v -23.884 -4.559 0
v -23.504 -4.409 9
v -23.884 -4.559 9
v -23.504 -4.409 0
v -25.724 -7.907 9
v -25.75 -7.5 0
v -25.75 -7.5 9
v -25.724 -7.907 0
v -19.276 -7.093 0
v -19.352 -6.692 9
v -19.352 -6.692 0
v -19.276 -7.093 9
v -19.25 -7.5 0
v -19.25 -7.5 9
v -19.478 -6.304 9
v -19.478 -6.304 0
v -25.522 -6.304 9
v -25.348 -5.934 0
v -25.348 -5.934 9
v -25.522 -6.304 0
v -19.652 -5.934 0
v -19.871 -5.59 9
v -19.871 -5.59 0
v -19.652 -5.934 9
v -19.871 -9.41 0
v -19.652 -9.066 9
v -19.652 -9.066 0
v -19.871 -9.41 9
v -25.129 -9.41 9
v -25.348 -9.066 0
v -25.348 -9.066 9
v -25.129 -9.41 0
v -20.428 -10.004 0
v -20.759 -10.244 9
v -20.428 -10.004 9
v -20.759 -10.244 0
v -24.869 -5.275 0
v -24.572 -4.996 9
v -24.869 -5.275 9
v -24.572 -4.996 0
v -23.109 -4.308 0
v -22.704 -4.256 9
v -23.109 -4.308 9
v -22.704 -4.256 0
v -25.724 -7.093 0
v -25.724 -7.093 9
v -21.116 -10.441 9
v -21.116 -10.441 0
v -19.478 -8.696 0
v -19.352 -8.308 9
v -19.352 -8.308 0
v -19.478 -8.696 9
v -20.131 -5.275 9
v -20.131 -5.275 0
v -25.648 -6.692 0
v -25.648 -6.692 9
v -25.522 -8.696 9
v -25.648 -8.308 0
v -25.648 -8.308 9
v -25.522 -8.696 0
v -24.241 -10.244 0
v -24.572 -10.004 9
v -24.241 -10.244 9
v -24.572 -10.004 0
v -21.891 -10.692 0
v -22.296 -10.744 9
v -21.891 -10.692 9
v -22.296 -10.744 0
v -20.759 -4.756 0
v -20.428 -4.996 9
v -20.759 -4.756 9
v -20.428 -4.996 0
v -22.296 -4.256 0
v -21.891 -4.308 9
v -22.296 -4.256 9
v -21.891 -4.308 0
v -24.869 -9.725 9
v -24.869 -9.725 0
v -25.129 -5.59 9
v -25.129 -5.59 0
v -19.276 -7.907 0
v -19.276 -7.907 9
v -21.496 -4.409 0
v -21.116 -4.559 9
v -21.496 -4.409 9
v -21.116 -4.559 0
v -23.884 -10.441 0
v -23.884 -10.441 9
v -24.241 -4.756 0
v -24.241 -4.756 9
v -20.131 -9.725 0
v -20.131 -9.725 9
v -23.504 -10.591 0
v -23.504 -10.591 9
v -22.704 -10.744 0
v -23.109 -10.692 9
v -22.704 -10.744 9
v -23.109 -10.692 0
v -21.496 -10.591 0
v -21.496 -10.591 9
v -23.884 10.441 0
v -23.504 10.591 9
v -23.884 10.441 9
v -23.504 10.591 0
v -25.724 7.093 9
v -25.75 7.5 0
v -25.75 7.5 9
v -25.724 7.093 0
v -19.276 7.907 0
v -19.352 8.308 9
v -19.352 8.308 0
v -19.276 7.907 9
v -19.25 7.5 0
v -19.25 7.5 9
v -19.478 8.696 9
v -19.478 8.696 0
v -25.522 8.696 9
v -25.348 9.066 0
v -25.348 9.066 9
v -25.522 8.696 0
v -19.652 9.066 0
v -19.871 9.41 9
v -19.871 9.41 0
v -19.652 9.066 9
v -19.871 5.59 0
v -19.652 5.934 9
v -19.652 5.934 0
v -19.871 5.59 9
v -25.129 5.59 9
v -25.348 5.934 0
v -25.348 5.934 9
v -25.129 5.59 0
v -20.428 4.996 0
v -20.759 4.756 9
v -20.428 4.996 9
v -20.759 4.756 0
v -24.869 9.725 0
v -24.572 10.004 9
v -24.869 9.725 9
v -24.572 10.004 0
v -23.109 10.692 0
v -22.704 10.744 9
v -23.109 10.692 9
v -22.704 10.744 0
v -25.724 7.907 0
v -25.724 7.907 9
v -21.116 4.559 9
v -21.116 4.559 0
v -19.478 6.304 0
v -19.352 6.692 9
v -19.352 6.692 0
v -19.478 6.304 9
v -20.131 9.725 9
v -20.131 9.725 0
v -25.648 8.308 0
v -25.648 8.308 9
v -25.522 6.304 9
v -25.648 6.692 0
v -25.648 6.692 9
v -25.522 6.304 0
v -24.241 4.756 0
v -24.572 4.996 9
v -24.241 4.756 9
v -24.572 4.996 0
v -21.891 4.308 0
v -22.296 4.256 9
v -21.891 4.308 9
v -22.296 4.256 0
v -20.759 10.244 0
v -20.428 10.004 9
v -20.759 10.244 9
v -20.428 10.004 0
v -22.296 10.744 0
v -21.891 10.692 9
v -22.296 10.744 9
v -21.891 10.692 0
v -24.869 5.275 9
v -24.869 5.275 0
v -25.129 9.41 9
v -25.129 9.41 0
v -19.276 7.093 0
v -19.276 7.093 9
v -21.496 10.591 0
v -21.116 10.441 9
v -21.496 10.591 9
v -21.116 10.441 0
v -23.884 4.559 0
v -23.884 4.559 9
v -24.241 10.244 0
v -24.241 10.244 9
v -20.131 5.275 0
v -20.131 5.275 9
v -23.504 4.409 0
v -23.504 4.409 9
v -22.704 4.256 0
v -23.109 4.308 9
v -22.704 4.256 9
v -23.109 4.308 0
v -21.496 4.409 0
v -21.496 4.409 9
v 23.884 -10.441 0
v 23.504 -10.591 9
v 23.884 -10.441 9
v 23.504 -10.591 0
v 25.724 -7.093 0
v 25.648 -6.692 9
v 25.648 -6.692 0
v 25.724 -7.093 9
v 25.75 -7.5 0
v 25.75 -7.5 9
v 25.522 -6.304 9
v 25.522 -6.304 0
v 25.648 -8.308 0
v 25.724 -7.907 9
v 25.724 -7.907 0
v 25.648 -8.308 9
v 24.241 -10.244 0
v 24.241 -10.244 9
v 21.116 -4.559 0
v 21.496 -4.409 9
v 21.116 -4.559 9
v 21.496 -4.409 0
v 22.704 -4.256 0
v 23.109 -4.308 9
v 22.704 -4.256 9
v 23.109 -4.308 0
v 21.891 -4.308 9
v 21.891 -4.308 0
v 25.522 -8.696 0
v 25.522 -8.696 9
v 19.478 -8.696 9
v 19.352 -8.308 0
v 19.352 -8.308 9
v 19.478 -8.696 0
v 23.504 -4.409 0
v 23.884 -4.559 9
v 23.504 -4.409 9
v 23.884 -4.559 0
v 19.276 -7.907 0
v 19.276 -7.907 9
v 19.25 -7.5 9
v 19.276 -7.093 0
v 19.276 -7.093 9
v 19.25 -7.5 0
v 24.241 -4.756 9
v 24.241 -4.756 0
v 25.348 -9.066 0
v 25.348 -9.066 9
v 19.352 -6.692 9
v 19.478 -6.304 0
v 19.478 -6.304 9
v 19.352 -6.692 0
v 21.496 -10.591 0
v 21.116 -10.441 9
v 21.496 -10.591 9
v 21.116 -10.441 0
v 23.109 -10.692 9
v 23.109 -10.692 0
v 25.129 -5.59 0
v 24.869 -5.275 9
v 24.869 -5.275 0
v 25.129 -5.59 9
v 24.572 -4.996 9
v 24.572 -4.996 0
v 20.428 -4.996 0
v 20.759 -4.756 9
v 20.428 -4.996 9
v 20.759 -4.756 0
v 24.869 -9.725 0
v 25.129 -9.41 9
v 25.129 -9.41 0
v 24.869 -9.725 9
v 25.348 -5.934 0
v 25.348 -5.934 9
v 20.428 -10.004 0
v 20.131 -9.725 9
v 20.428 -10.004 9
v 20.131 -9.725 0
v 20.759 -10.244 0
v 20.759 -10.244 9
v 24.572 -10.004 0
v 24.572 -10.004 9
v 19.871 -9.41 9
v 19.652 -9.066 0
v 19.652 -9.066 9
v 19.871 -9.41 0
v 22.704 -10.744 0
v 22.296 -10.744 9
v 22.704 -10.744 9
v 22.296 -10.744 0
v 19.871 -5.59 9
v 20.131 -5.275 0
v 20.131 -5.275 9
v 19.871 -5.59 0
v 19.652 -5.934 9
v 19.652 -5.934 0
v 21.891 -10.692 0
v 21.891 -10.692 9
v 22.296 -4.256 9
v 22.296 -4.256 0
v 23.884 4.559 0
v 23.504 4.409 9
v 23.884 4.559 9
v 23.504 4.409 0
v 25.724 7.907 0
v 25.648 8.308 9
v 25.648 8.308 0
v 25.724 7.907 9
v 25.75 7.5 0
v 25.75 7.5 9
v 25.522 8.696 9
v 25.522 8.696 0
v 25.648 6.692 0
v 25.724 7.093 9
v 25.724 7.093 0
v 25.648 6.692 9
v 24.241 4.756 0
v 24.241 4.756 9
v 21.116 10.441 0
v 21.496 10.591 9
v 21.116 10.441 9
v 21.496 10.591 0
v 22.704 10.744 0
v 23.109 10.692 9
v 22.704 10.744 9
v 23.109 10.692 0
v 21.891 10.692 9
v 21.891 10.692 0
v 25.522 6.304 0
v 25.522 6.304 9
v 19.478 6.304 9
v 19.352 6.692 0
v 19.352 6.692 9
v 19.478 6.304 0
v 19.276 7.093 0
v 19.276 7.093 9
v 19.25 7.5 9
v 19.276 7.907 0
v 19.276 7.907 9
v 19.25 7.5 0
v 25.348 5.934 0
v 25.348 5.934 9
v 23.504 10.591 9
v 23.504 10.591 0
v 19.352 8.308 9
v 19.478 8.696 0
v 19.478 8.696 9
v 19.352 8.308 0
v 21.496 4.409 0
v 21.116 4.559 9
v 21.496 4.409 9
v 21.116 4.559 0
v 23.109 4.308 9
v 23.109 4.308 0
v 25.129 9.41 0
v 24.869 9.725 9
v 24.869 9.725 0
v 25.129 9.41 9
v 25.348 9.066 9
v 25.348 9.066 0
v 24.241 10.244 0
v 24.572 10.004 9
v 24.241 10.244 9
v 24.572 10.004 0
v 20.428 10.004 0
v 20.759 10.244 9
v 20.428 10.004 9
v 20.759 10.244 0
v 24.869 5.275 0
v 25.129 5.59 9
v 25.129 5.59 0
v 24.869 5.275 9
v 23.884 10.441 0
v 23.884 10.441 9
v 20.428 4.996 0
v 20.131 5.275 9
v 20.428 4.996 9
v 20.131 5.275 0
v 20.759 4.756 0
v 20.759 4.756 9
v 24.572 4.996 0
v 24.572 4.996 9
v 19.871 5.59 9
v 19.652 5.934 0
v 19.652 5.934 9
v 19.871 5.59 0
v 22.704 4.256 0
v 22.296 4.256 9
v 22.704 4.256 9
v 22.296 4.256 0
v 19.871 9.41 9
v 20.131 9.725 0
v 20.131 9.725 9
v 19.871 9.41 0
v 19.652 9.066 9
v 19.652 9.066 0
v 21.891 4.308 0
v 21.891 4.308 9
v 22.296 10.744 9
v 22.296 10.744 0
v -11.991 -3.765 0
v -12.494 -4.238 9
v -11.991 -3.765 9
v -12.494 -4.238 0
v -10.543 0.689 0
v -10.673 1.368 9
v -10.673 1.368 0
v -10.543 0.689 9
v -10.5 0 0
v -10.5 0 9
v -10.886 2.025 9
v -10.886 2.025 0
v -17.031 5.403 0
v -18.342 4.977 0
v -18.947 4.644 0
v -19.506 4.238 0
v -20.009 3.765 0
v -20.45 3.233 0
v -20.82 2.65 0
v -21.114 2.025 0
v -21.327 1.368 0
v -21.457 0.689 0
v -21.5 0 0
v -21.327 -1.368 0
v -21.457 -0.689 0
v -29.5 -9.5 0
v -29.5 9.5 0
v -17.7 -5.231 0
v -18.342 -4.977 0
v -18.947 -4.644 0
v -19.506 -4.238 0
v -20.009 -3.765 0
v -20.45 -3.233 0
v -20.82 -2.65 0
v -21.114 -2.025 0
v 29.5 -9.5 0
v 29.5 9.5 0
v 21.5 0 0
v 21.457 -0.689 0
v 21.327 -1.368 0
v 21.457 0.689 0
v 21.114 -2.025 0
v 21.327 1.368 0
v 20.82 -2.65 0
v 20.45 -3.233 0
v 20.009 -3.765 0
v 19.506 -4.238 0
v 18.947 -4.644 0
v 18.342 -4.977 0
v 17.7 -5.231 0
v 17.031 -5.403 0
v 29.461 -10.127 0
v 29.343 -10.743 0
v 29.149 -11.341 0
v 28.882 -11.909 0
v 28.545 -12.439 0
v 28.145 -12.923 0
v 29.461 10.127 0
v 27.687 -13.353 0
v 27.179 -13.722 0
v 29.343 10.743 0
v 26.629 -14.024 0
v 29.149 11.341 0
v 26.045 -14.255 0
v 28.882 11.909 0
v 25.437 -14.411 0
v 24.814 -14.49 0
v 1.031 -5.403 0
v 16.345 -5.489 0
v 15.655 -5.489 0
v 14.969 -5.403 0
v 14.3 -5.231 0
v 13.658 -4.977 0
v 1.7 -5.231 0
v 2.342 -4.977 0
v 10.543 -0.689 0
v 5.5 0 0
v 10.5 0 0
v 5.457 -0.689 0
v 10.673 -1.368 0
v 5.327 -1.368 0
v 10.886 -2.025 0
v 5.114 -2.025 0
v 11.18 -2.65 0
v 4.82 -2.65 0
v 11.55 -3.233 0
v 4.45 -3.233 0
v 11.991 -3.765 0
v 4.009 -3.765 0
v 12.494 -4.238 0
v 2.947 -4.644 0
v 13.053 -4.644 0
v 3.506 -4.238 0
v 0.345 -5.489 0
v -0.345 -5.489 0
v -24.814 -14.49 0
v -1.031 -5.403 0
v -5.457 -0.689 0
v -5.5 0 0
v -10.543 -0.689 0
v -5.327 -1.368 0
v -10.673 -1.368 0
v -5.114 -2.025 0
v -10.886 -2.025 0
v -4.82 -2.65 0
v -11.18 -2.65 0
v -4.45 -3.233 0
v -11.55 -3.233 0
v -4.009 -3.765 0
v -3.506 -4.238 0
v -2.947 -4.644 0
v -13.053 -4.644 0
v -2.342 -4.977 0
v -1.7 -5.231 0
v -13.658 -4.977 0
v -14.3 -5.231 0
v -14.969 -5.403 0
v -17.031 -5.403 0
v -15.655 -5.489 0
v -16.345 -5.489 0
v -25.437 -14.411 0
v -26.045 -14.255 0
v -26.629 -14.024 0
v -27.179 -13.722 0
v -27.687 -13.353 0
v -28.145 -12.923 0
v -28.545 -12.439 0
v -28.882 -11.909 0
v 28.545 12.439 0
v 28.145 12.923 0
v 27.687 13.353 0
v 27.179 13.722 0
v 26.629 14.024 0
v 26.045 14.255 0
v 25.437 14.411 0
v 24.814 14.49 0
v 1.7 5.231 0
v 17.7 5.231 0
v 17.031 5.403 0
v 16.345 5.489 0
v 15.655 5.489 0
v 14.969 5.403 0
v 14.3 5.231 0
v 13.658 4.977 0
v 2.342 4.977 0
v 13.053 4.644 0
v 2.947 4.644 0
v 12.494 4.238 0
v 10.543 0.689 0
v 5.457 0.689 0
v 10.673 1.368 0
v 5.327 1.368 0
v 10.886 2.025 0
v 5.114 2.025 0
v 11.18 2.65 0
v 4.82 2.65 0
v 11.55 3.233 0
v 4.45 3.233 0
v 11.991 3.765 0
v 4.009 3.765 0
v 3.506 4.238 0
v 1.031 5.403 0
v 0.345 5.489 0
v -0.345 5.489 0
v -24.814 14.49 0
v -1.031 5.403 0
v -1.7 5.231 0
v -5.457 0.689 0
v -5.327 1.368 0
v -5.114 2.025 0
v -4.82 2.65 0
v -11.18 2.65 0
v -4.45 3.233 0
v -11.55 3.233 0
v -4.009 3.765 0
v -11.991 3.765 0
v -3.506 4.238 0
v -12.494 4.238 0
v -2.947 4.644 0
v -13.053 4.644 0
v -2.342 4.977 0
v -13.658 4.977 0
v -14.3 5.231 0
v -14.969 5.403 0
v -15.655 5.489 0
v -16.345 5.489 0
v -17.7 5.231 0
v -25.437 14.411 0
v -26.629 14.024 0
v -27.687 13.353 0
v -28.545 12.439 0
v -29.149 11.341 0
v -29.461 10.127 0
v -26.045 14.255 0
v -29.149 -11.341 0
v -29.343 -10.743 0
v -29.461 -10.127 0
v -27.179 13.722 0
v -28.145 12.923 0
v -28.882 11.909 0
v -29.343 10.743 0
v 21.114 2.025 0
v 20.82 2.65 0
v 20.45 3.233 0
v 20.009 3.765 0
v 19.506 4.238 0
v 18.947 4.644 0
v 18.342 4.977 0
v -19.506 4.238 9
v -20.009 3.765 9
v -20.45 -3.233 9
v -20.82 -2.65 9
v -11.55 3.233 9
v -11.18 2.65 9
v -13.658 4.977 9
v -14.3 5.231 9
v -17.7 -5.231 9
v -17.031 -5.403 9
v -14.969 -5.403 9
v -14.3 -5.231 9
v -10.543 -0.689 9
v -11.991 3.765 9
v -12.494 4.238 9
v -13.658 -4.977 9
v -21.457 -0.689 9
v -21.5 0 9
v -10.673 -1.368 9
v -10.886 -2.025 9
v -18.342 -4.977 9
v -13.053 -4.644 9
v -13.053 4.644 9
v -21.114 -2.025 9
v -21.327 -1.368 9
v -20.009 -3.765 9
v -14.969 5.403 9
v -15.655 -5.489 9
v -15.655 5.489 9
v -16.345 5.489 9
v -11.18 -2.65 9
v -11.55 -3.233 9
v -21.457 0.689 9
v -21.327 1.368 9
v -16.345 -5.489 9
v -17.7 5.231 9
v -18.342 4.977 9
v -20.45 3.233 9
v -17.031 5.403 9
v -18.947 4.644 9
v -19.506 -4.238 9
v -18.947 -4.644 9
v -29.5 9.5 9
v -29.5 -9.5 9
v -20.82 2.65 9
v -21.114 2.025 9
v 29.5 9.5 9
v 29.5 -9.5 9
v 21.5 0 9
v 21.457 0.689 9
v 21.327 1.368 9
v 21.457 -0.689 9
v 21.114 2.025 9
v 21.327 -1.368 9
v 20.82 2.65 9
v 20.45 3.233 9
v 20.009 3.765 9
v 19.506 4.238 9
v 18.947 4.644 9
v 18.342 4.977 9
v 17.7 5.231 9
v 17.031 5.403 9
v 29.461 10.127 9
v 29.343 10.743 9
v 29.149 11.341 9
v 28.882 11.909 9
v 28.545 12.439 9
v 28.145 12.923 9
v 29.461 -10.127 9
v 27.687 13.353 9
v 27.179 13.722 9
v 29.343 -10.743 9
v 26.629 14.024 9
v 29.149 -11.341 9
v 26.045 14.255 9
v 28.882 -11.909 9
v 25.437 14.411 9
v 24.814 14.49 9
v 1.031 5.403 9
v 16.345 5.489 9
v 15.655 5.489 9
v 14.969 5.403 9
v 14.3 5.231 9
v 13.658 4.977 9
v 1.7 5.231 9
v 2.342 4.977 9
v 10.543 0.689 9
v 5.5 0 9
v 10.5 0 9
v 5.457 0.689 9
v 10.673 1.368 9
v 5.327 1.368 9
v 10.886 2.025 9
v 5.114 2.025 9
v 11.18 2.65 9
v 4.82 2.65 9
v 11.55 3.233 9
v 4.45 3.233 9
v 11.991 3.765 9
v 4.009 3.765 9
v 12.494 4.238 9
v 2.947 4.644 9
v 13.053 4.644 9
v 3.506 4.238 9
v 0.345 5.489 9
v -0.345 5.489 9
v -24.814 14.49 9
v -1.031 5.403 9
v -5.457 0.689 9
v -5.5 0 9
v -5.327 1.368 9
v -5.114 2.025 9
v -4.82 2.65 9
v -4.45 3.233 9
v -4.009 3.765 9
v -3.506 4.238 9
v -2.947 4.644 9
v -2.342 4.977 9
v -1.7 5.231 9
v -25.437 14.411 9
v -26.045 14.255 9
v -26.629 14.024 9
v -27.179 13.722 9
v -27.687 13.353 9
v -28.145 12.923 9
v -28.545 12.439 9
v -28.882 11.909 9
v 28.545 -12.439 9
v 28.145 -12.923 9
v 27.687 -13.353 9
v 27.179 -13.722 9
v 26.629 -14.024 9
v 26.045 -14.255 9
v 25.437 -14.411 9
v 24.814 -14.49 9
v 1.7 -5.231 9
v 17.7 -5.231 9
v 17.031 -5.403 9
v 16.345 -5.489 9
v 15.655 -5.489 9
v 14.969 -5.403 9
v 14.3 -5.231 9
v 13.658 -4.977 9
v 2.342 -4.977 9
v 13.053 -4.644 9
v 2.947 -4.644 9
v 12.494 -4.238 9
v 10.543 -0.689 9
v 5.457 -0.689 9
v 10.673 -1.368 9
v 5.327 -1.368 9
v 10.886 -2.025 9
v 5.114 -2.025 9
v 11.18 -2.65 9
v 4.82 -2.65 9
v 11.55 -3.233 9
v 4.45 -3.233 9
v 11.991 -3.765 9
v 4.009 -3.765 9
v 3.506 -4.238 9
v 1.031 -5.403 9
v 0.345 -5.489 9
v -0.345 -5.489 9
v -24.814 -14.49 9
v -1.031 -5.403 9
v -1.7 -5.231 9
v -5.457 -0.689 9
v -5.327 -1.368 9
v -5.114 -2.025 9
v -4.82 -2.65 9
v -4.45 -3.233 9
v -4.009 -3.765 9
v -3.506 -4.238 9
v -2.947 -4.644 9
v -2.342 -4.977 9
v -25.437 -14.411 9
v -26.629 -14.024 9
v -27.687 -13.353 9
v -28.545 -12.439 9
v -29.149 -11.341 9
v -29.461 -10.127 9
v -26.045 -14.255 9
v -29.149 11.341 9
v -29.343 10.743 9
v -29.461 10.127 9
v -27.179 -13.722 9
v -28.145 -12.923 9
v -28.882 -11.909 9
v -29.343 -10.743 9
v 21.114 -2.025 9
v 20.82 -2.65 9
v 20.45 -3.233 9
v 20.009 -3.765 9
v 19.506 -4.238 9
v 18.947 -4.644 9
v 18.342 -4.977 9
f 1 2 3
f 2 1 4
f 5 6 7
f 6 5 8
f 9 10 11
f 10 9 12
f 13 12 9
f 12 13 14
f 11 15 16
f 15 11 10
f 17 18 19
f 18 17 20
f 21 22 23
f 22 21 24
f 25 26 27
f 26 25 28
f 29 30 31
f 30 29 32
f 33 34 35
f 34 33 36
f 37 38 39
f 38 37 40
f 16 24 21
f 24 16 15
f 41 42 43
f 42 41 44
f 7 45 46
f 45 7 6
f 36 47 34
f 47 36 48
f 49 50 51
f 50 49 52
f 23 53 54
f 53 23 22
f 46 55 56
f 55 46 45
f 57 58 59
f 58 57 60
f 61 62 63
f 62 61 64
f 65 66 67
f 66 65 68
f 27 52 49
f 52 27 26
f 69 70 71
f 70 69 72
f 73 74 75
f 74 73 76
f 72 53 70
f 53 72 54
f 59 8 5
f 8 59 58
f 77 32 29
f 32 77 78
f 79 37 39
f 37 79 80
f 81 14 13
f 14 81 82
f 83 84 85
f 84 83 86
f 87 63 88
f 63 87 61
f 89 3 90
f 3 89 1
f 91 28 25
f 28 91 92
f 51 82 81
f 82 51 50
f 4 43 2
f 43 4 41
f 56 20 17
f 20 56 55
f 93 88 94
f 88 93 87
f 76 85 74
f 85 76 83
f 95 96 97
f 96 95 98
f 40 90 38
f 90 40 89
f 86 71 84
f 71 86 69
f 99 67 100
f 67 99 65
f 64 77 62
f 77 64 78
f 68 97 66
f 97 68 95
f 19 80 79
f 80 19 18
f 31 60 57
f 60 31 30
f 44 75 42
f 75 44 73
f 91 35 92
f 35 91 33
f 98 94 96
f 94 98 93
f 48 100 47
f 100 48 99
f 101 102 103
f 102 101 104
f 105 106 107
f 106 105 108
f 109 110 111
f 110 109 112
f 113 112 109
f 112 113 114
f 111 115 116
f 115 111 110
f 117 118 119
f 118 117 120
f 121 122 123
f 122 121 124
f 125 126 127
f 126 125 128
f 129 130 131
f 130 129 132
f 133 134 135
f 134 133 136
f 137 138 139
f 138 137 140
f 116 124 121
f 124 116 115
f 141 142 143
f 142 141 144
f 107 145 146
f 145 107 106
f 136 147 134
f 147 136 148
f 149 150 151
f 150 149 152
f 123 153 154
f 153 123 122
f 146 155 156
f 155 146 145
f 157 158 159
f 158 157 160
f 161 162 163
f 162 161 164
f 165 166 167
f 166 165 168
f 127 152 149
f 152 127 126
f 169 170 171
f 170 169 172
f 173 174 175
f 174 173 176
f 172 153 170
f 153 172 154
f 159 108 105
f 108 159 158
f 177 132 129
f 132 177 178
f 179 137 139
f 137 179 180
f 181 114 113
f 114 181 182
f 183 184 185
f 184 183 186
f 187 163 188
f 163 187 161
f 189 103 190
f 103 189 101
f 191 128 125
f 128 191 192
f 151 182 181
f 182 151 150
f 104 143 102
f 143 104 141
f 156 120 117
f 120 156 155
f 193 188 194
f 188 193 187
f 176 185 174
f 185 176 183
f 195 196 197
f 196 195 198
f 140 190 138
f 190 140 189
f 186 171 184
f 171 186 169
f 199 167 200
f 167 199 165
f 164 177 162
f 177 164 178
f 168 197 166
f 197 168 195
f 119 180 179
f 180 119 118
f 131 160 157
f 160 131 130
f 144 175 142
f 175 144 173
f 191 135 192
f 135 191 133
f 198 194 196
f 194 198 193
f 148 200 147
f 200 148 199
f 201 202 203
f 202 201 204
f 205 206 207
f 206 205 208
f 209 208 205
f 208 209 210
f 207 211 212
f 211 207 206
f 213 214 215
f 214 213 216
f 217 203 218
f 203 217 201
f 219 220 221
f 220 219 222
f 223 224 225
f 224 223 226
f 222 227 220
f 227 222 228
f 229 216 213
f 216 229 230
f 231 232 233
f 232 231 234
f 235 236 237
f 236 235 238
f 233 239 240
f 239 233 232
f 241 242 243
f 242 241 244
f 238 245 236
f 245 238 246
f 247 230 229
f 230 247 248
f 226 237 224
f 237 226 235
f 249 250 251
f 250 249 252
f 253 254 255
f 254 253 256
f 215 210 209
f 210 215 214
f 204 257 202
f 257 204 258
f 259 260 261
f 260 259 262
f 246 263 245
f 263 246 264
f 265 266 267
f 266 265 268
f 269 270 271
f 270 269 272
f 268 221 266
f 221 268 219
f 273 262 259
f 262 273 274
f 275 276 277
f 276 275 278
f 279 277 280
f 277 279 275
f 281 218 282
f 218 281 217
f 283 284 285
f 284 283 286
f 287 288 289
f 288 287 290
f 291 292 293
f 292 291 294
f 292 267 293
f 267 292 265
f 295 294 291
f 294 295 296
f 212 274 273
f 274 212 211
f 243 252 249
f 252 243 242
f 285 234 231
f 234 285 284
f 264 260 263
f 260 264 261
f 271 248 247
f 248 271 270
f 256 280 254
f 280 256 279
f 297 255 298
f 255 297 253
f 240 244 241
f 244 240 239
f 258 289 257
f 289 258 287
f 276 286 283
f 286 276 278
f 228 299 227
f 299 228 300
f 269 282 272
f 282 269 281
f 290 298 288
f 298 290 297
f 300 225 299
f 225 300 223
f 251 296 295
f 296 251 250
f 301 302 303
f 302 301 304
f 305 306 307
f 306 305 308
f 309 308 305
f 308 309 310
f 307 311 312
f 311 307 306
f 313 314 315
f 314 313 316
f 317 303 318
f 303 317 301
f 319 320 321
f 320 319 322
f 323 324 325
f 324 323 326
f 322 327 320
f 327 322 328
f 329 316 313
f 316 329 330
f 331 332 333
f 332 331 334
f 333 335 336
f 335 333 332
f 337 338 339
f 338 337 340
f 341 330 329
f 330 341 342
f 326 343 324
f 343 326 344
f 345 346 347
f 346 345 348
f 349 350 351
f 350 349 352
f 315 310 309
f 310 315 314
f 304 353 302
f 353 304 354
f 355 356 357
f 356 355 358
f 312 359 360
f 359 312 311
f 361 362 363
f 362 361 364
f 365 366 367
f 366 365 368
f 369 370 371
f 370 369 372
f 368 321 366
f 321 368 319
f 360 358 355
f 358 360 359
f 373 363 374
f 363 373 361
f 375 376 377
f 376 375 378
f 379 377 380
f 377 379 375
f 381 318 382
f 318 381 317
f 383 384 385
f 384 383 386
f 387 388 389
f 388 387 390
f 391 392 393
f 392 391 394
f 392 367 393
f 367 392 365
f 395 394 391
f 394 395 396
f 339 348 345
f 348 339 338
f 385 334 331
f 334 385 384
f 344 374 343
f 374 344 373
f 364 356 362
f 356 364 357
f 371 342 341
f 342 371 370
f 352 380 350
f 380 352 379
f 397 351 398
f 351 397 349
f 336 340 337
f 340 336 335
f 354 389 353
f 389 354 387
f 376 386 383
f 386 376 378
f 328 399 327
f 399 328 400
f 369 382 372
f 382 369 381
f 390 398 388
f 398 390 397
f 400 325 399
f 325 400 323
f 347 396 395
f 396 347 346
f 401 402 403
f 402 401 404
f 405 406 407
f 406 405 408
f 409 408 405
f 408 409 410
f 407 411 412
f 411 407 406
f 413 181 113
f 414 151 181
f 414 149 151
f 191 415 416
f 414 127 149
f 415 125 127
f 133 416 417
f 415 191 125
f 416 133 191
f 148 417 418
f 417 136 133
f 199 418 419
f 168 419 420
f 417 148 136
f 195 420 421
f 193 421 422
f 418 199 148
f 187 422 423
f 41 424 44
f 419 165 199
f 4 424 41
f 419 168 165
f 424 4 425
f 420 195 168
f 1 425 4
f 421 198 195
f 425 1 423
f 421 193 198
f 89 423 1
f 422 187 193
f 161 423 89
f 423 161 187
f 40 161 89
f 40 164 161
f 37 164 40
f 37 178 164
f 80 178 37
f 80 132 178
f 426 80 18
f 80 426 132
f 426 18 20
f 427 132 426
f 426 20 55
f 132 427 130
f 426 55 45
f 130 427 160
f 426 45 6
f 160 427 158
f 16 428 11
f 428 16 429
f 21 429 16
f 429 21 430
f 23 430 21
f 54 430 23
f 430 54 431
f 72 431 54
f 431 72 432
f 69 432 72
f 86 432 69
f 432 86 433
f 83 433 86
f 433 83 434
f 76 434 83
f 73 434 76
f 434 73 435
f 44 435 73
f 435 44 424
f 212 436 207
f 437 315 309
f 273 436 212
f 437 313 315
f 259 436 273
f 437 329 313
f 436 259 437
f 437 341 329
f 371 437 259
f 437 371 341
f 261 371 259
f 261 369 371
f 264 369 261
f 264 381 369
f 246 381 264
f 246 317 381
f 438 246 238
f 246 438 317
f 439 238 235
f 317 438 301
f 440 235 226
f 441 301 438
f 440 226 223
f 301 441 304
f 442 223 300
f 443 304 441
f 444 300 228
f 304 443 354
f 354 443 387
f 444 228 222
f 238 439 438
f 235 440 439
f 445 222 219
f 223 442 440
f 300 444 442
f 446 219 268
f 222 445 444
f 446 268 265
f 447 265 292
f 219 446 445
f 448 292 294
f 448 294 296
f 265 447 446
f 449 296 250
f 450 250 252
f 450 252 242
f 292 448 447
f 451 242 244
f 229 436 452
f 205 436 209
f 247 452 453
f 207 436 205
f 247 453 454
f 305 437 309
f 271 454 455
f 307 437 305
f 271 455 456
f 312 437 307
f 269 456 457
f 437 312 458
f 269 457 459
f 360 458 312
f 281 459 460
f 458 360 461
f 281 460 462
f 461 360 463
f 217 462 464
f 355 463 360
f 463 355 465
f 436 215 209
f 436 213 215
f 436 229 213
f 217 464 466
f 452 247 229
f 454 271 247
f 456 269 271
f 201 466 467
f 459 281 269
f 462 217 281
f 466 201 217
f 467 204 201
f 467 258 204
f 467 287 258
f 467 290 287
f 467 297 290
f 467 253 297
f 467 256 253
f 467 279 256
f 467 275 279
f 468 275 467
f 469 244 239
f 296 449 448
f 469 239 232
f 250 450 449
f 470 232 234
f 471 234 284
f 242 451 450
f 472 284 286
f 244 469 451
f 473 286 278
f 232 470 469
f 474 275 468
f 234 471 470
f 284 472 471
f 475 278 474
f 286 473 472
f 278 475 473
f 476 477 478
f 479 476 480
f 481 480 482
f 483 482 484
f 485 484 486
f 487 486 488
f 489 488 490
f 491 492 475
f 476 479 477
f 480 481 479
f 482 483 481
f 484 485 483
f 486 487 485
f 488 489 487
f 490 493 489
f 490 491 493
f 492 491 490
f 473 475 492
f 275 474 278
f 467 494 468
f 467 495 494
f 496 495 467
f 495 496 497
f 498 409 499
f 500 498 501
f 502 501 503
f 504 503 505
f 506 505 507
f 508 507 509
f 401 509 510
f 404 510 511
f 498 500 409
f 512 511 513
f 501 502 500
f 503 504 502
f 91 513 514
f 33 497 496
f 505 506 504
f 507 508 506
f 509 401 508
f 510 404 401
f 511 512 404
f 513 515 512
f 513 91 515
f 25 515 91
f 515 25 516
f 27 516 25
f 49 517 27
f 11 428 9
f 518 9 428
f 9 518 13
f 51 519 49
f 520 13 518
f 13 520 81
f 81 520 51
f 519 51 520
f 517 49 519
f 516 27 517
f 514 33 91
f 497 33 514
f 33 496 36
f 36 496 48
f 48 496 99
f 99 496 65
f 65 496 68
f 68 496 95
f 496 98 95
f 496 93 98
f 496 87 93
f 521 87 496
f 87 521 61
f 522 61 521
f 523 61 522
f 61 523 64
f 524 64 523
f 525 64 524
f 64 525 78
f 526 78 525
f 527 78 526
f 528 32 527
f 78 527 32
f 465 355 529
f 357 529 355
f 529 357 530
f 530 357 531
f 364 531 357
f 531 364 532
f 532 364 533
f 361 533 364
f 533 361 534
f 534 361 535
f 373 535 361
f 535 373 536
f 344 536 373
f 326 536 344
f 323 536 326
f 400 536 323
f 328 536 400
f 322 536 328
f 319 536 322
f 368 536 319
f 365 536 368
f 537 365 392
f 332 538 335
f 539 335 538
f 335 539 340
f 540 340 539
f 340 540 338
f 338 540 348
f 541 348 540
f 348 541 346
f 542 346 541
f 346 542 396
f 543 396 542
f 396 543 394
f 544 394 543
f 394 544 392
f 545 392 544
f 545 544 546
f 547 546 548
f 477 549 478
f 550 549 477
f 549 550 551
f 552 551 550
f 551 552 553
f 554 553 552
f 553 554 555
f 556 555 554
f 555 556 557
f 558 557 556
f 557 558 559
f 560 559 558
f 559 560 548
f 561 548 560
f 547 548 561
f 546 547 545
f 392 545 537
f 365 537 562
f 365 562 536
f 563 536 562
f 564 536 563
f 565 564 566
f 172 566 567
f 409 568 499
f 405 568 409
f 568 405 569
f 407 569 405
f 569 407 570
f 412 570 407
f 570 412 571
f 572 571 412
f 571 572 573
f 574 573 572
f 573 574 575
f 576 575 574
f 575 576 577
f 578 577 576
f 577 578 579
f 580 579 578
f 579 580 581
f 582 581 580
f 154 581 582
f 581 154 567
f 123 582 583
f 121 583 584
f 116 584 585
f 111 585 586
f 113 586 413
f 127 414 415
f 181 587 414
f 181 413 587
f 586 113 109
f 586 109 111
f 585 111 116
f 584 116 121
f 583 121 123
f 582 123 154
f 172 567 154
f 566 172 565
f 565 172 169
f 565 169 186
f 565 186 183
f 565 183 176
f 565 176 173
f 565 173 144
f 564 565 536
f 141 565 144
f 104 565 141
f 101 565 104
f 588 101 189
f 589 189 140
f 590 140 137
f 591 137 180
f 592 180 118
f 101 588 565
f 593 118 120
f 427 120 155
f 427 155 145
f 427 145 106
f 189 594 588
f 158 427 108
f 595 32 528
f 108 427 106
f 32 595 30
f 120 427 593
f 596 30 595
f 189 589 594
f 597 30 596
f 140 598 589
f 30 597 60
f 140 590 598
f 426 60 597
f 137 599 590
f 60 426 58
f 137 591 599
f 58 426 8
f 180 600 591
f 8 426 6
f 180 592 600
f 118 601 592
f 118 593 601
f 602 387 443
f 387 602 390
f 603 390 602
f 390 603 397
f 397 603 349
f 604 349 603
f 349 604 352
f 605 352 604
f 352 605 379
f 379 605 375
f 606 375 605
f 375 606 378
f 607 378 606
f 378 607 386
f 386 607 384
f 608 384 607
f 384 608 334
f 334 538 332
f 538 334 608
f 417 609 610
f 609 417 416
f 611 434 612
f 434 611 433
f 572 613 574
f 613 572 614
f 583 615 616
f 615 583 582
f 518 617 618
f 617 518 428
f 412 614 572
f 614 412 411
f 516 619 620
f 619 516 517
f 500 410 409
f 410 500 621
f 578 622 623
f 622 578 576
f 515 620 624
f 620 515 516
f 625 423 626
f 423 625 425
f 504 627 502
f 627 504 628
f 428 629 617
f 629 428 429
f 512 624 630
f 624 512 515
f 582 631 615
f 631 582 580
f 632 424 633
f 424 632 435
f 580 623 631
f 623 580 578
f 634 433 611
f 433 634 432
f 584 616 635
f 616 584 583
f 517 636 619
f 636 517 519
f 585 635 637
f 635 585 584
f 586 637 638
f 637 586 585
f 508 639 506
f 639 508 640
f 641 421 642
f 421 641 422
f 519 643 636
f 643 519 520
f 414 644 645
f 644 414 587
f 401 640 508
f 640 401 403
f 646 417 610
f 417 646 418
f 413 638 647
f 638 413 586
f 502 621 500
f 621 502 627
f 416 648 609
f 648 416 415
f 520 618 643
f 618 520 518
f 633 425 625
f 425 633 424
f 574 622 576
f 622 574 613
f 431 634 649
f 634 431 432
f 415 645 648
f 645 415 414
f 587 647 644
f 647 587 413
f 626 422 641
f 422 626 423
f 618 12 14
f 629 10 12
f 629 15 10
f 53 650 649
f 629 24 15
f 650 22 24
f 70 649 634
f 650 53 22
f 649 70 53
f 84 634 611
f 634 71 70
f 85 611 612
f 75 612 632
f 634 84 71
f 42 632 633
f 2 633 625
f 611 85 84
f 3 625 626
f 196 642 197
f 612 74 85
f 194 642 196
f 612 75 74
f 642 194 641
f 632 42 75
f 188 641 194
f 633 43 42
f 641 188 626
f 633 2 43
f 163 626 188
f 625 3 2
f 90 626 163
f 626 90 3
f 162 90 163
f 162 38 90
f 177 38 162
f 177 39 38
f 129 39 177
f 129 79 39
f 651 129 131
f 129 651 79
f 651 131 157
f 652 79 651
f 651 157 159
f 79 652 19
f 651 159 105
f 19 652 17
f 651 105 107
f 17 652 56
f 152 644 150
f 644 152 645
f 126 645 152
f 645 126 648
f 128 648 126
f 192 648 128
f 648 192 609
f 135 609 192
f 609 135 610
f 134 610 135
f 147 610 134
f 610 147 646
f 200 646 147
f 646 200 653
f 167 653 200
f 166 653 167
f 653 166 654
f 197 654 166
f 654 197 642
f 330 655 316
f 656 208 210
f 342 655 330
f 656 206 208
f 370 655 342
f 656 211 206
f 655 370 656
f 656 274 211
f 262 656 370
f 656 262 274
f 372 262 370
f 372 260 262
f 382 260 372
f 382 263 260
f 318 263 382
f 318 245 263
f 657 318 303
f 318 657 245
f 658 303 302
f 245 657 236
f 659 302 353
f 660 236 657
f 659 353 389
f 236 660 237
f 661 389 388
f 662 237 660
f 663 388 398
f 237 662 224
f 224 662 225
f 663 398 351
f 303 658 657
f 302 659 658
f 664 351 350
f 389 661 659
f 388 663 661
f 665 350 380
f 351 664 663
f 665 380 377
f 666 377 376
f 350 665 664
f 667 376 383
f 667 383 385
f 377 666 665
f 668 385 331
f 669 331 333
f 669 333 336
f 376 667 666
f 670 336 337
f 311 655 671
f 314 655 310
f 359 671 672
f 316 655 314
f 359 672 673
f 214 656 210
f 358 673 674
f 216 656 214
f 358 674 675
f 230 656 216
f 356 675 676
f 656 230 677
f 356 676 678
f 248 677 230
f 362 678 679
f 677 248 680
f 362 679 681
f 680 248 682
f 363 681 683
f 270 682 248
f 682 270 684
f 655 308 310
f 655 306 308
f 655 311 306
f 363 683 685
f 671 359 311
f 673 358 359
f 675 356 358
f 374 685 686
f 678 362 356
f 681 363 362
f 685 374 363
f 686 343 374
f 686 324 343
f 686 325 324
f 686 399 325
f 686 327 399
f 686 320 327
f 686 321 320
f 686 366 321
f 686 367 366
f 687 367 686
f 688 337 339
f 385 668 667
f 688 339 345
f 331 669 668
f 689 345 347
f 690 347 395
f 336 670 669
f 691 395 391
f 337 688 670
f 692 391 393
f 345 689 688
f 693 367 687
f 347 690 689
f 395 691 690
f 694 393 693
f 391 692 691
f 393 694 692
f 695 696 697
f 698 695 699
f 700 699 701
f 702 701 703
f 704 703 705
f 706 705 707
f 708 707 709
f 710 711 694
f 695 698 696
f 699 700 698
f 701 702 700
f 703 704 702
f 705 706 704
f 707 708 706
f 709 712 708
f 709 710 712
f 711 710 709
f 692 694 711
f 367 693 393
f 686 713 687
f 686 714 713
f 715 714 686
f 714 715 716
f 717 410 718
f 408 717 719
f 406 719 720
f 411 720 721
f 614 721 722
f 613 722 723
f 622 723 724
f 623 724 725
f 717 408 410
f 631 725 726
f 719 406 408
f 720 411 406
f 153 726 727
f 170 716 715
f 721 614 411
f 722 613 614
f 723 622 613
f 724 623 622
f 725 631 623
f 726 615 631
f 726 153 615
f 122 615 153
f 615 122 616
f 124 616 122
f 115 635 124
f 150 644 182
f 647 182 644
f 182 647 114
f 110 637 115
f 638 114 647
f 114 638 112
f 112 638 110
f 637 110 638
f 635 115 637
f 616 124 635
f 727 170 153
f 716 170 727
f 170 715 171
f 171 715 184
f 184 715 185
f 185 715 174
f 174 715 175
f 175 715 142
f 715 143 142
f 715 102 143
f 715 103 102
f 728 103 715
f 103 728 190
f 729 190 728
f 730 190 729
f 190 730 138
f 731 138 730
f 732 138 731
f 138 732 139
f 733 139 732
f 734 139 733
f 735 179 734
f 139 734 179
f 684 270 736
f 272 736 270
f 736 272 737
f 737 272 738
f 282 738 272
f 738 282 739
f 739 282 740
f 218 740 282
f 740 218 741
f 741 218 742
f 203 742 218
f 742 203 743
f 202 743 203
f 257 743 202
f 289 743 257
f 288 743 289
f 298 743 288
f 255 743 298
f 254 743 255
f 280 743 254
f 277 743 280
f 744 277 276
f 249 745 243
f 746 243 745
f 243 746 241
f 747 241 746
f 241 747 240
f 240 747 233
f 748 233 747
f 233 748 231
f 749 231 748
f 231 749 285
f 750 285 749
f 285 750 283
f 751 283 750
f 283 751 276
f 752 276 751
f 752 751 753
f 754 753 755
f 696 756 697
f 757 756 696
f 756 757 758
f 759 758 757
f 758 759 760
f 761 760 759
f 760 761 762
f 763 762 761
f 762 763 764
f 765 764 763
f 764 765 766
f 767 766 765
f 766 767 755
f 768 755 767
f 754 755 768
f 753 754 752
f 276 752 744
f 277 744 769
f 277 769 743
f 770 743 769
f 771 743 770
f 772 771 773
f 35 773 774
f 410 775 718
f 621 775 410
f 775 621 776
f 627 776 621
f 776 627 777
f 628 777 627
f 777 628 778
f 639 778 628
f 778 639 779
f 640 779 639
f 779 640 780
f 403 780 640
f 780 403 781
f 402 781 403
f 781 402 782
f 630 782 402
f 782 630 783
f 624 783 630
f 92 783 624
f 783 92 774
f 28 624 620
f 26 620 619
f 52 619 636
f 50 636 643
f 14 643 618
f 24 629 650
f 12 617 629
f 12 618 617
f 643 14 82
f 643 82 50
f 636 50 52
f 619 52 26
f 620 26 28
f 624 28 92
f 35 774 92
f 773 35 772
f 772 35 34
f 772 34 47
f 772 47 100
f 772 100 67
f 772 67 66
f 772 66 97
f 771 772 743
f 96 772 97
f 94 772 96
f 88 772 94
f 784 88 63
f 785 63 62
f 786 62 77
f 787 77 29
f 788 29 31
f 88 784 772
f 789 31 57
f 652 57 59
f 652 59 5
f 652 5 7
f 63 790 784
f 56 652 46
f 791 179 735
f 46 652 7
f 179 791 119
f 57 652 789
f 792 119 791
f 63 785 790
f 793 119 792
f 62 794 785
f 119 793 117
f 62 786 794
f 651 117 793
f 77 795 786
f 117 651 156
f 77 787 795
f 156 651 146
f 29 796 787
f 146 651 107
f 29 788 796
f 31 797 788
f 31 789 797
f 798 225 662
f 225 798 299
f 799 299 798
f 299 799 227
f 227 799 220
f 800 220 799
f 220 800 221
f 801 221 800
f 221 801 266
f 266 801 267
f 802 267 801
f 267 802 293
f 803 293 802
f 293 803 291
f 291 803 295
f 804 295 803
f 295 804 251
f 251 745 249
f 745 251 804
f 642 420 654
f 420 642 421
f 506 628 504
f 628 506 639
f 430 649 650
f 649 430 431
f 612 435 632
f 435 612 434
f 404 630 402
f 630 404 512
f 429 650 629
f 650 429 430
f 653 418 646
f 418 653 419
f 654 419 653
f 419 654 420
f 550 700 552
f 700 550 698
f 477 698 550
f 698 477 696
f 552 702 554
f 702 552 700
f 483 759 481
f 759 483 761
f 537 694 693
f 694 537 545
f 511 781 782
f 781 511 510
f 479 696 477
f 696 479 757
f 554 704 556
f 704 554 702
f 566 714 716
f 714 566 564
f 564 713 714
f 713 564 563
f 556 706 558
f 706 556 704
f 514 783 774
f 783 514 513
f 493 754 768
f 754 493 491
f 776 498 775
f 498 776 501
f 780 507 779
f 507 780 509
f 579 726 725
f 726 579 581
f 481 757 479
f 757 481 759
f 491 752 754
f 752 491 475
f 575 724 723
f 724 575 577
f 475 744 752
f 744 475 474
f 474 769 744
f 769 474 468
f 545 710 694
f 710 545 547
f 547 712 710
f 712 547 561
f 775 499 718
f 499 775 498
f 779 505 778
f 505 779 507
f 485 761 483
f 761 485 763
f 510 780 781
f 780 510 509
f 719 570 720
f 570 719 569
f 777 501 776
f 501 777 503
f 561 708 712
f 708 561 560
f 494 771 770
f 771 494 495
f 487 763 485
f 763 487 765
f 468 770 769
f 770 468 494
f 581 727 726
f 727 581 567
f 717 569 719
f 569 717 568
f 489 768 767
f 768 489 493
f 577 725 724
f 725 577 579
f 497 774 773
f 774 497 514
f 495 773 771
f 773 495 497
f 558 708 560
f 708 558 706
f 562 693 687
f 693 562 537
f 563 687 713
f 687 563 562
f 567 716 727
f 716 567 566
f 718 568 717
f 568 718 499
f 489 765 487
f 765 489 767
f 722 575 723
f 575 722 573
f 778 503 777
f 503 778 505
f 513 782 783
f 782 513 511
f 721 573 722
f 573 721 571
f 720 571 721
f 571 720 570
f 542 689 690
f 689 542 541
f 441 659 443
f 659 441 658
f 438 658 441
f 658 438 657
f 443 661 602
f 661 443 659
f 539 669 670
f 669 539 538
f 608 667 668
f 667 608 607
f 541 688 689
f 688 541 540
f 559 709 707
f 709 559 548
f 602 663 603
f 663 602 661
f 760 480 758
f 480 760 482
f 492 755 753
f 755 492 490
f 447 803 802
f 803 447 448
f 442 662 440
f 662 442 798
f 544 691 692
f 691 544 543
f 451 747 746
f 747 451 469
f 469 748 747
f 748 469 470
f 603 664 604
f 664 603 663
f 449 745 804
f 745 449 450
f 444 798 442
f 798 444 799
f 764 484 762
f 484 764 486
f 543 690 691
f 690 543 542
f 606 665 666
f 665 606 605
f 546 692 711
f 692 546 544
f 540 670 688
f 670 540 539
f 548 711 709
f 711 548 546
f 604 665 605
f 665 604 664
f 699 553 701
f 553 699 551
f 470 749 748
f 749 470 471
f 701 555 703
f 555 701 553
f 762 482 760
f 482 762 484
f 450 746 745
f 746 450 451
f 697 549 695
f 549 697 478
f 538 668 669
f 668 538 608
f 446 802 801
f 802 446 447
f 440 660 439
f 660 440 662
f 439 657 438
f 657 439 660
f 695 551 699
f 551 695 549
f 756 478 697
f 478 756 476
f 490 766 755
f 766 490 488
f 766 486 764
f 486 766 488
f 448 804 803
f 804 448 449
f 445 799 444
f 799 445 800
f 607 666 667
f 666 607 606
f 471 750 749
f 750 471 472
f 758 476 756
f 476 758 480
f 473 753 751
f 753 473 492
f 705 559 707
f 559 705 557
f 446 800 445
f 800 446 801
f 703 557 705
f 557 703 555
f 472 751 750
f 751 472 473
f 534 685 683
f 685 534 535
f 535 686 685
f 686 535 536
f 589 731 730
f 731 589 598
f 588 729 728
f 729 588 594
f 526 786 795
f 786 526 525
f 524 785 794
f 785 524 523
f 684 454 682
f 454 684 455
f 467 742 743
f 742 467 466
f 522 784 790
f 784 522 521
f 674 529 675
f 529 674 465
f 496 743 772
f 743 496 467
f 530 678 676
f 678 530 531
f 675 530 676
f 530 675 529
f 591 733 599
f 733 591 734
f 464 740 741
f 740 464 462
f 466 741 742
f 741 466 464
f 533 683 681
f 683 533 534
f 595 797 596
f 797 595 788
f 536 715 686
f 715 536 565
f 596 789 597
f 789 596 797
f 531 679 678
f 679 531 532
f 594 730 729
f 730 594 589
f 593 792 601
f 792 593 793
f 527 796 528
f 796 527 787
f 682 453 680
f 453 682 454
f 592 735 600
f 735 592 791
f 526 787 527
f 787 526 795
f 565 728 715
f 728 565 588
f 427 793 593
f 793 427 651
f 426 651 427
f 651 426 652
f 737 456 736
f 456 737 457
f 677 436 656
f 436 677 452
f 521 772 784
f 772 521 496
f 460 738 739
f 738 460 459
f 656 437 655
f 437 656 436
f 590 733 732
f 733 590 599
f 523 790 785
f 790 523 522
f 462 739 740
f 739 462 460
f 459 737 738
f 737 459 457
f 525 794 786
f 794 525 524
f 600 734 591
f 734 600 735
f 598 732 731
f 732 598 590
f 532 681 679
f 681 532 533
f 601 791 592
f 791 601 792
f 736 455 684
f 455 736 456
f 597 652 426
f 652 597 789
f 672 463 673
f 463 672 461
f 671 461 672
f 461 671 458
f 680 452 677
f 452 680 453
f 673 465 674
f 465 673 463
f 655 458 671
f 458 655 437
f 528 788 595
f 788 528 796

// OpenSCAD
$fn = 50;


difference() {
	union() {
		hull() {
			translate(v = [-24.5000000000, 9.5000000000, 0]) {
				cylinder(h = 9, r = 5);
			}
			translate(v = [24.5000000000, 9.5000000000, 0]) {
				cylinder(h = 9, r = 5);
			}
			translate(v = [-24.5000000000, -9.5000000000, 0]) {
				cylinder(h = 9, r = 5);
			}
			translate(v = [24.5000000000, -9.5000000000, 0]) {
				cylinder(h = 9, r = 5);
			}
		}
	}
	union() {
		#translate(v = [-22.5000000000, -7.5000000000, -100.0000000000]) {
			cylinder(h = 200, r = 3.2500000000);
		}
		#translate(v = [-22.5000000000, 7.5000000000, -100.0000000000]) {
			cylinder(h = 200, r = 3.2500000000);
		}
		#translate(v = [22.5000000000, -7.5000000000, -100.0000000000]) {
			cylinder(h = 200, r = 3.2500000000);
		}
		#translate(v = [22.5000000000, 7.5000000000, -100.0000000000]) {
			cylinder(h = 200, r = 3.2500000000);
		}
		#translate(v = [-16.0000000000, 0, 0]) {
			cylinder(h = 9, r = 5.5000000000);
		}
		#cylinder(h = 9, r = 5.5000000000);
		#translate(v = [16.0000000000, 0, 0]) {
			cylinder(h = 9, r = 5.5000000000);
		}
	}
}
